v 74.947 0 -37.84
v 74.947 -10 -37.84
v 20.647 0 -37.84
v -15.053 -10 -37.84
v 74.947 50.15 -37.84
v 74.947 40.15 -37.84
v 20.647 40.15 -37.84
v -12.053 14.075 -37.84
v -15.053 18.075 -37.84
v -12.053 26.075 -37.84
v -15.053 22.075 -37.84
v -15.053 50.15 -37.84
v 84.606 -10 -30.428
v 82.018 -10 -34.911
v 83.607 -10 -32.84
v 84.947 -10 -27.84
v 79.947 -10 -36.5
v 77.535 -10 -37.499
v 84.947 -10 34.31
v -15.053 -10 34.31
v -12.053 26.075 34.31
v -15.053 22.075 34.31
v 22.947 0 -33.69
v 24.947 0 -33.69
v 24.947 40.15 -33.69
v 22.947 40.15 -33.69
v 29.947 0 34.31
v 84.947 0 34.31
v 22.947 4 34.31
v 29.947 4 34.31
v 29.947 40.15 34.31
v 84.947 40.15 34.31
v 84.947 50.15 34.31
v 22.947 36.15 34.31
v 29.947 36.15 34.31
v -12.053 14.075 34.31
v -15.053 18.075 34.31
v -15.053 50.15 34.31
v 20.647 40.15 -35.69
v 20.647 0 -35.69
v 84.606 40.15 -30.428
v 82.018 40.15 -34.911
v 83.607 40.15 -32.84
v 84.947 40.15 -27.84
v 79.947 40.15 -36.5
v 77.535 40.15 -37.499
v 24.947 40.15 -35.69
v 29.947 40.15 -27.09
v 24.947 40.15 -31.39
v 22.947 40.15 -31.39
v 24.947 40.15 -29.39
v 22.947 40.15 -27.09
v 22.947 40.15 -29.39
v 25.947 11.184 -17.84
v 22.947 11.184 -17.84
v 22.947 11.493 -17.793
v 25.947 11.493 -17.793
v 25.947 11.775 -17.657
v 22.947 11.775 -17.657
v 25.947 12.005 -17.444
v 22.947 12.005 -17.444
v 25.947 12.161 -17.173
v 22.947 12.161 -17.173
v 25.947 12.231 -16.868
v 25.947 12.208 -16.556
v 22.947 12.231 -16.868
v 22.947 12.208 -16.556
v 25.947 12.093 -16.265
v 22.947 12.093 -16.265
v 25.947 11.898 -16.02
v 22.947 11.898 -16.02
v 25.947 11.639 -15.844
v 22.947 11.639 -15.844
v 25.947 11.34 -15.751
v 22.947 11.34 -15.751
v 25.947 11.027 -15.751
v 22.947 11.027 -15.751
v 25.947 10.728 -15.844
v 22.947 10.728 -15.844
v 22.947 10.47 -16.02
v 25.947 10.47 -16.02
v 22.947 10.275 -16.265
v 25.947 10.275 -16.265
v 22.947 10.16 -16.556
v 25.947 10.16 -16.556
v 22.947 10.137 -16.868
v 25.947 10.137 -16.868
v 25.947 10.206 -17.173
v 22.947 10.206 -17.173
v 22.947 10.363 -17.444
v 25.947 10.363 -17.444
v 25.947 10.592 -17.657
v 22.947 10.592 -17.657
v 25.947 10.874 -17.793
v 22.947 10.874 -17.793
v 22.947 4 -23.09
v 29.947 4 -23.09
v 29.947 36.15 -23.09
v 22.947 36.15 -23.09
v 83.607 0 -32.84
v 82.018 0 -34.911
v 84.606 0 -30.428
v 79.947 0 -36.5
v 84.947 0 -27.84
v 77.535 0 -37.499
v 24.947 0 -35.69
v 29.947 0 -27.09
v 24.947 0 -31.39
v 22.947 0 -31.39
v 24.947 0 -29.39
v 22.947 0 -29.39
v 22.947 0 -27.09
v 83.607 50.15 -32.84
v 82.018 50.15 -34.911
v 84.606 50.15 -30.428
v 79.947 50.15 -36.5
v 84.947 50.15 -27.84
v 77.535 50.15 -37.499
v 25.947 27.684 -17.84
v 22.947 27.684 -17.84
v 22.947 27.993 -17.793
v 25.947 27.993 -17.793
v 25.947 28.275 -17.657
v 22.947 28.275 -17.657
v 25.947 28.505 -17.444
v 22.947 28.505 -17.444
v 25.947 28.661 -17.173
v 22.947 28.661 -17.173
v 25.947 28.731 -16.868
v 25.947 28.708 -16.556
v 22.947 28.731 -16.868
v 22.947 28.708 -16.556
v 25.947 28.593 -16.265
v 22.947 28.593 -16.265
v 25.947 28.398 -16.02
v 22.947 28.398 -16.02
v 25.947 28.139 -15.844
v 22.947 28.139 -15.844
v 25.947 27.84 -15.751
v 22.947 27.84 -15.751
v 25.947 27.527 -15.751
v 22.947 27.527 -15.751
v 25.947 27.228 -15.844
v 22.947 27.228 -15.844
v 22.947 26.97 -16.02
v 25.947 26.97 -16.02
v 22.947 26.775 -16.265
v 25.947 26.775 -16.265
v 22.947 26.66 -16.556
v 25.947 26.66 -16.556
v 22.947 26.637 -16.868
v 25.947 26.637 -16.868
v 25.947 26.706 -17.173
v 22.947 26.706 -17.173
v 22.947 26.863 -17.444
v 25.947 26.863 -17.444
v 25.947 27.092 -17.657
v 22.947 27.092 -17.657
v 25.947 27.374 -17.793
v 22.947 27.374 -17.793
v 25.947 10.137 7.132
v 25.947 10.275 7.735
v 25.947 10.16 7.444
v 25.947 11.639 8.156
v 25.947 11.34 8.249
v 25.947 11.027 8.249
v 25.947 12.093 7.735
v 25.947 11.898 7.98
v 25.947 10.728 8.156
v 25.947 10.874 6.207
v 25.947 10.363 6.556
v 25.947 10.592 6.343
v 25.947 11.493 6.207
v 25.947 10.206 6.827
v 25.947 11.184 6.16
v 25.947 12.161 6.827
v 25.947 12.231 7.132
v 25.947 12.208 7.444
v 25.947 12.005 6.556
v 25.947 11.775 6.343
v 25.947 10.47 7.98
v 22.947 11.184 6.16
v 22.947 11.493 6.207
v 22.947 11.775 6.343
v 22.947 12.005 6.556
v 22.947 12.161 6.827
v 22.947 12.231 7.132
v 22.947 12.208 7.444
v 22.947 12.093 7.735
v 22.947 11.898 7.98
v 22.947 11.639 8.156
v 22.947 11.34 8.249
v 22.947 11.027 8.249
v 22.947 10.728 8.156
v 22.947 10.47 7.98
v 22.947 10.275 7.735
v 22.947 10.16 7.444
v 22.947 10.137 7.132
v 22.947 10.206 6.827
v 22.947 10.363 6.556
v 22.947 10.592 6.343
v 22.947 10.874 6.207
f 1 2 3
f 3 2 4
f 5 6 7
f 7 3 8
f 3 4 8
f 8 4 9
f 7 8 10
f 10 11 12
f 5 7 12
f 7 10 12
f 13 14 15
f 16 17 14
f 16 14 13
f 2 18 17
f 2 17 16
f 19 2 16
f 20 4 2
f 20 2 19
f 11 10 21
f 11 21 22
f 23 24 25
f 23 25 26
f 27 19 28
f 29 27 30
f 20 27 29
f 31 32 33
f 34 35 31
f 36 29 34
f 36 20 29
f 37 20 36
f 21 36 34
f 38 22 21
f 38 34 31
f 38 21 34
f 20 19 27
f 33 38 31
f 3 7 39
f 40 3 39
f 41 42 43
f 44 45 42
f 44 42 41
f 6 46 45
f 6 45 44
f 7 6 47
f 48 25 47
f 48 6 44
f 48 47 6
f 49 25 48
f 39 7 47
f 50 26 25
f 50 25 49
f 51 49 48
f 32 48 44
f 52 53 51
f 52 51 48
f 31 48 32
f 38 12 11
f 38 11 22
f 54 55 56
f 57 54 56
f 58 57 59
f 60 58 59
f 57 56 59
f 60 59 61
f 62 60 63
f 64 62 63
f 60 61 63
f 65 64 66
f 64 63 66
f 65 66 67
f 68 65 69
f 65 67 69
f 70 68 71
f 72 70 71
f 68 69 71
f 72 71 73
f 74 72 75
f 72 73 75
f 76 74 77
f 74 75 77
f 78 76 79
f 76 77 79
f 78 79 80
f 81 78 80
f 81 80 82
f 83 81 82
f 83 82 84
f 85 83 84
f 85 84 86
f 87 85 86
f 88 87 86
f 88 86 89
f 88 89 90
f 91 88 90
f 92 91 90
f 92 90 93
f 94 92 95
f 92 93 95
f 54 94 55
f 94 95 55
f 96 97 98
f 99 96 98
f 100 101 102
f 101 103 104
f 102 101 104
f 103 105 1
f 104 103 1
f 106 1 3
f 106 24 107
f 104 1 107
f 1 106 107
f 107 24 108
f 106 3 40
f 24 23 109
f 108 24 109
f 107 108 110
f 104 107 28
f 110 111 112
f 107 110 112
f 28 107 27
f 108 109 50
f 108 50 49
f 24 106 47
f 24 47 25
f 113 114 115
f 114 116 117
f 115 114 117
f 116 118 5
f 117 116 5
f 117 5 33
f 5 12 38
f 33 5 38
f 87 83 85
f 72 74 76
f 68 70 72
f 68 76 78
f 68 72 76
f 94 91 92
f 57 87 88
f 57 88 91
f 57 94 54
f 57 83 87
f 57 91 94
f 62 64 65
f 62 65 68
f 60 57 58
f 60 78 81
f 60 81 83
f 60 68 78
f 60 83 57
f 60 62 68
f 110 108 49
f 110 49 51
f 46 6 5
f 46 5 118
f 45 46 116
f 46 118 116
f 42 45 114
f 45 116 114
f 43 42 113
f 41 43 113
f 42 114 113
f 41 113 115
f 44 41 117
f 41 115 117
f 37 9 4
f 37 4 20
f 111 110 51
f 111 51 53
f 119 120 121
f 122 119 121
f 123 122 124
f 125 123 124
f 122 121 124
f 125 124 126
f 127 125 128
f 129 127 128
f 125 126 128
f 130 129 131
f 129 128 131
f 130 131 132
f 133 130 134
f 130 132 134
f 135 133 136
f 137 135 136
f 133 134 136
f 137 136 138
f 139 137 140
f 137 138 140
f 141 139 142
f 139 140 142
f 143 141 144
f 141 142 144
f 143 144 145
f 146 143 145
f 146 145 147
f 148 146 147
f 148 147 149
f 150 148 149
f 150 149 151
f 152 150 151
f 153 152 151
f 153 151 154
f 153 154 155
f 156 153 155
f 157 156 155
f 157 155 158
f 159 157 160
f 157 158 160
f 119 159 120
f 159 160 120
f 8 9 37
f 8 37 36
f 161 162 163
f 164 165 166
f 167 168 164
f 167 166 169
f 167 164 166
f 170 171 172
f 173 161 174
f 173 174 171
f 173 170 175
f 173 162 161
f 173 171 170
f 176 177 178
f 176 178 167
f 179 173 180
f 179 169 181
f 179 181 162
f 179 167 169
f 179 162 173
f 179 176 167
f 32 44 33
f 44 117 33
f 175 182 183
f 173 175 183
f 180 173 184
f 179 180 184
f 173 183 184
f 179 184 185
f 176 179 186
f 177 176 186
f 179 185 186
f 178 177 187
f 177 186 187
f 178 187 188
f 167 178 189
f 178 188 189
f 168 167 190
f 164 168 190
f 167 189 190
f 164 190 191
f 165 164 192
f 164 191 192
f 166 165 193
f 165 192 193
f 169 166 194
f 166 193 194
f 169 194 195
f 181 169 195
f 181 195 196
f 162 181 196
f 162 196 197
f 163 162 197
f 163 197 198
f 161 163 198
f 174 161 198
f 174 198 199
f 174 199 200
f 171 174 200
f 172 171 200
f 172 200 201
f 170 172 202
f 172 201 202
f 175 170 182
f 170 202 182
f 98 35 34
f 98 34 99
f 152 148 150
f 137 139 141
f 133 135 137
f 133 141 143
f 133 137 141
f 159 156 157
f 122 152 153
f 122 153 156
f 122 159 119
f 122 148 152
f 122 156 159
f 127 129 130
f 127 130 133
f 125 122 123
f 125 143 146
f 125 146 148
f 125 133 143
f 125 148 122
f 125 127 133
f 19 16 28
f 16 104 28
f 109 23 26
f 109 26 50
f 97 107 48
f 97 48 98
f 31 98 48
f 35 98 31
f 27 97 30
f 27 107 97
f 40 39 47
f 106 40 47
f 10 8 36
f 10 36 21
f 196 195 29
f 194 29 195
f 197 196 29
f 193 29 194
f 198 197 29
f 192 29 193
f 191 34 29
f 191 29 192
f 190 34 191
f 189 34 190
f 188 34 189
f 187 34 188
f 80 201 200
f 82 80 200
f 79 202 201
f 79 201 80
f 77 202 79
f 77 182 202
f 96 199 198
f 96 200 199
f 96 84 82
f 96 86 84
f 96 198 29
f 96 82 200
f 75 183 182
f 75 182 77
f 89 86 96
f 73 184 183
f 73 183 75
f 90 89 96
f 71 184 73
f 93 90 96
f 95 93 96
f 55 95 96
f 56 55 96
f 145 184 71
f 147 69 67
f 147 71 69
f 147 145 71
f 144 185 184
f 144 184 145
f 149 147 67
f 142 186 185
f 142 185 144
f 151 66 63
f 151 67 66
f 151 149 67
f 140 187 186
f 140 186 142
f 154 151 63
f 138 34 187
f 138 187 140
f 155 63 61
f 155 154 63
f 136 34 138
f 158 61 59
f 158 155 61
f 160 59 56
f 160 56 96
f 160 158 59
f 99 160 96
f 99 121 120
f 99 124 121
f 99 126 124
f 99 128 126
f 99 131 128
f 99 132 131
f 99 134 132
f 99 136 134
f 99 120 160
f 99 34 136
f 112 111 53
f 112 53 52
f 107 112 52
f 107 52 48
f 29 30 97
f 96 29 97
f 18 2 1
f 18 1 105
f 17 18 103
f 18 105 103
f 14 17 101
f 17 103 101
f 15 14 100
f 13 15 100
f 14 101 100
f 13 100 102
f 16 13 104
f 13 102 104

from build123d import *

# Parameters (mm, degrees)
PAD_DEPTH       = 40.15
SKETCH001_W     = 72.15
SKETCH001_H     = 10
PAD001_DEPTH    = 100
FILLET_R        = 10
SKETCH002_W     = 57.4
SKETCH002_H     = 32.15
POCKET_DEPTH    = 7
SKETCH003_R     = 1.05
PAD002_DEPTH    = 3
POCKET001_DEPTH = 72.151


with BuildPart() as part:
    # Sketch → Pad (new body)
    with BuildSketch(Plane(origin=(24.695071, 0, 0), x_dir=(0, 0, 1), z_dir=(0, 1, 0))):
        Polygon((-27.089598, 5.251773), (34.310402, 5.251773), (34.310402, -39.748227), (-37.839598, -39.748227), (-37.839598, -4.048227), (-35.689598, -4.048227), (-35.689598, 0.251773), (-33.689598, 0.251773), (-33.689598, -1.748227), (-31.389598, -1.748227), (-31.389598, 0.251773), (-29.389598, 0.251773), (-29.389598, -1.748227), (-27.089598, -1.748227), align=None)
    extrude(amount=PAD_DEPTH)

    # Sketch001 (on Face4 of Pad) → Pad001 (join)
    with BuildSketch(Plane.ZY.offset(15.053156)):
        with Locations((-1.764598, -5)):
            Rectangle(SKETCH001_W, SKETCH001_H)
        with Locations((-1.764598, 45.15)):
            Rectangle(SKETCH001_W, SKETCH001_H)
    extrude(amount=-PAD001_DEPTH)

    # Fillet
    fillet_edges = [part.edges().sort_by_distance(p)[0] for p in [
        (84.946844, -5, -37.839598),
        (84.946844, 45.15, -37.839598),
    ]]
    fillet(fillet_edges, radius=FILLET_R)

    # Sketch002 (on Face6 of Fillet) → Pocket (cut)
    with BuildSketch(Plane(origin=(29.946844, 0, 0), x_dir=(0, 0, -1), z_dir=(1, 0, 0))):
        with Locations((-5.610402, 20.075)):
            Rectangle(SKETCH002_W, SKETCH002_H)
    extrude(amount=-POCKET_DEPTH, mode=Mode.SUBTRACT)

    # Sketch003 (on Face25 of Pocket) → Pad002 (join)
    with BuildSketch(Plane(origin=(22.946844, 0, 0), x_dir=(0, 0, -1), z_dir=(1, 0, 0))):
        with Locations((16.789598, 11.183873)):
            Circle(SKETCH003_R)
        with Locations((16.789598, 27.683873)):
            Circle(SKETCH003_R)
        with Locations((-7.210402, 11.183873)):
            Circle(SKETCH003_R)
    extrude(amount=PAD002_DEPTH)

    # Sketch004 (on Face20 of Pad002) → Pocket001 (cut, through all)
    with BuildSketch(Plane(origin=(24.695071, 0, -37.839598), x_dir=(-1, 0, 0), z_dir=(0, 0, -1))):
        Polygon((36.748227, 26.075), (39.748227, 22.075), (39.748227, 18.075), (36.748227, 14.075), align=None)
    extrude(amount=-POCKET001_DEPTH, mode=Mode.SUBTRACT)


solid = part.part
